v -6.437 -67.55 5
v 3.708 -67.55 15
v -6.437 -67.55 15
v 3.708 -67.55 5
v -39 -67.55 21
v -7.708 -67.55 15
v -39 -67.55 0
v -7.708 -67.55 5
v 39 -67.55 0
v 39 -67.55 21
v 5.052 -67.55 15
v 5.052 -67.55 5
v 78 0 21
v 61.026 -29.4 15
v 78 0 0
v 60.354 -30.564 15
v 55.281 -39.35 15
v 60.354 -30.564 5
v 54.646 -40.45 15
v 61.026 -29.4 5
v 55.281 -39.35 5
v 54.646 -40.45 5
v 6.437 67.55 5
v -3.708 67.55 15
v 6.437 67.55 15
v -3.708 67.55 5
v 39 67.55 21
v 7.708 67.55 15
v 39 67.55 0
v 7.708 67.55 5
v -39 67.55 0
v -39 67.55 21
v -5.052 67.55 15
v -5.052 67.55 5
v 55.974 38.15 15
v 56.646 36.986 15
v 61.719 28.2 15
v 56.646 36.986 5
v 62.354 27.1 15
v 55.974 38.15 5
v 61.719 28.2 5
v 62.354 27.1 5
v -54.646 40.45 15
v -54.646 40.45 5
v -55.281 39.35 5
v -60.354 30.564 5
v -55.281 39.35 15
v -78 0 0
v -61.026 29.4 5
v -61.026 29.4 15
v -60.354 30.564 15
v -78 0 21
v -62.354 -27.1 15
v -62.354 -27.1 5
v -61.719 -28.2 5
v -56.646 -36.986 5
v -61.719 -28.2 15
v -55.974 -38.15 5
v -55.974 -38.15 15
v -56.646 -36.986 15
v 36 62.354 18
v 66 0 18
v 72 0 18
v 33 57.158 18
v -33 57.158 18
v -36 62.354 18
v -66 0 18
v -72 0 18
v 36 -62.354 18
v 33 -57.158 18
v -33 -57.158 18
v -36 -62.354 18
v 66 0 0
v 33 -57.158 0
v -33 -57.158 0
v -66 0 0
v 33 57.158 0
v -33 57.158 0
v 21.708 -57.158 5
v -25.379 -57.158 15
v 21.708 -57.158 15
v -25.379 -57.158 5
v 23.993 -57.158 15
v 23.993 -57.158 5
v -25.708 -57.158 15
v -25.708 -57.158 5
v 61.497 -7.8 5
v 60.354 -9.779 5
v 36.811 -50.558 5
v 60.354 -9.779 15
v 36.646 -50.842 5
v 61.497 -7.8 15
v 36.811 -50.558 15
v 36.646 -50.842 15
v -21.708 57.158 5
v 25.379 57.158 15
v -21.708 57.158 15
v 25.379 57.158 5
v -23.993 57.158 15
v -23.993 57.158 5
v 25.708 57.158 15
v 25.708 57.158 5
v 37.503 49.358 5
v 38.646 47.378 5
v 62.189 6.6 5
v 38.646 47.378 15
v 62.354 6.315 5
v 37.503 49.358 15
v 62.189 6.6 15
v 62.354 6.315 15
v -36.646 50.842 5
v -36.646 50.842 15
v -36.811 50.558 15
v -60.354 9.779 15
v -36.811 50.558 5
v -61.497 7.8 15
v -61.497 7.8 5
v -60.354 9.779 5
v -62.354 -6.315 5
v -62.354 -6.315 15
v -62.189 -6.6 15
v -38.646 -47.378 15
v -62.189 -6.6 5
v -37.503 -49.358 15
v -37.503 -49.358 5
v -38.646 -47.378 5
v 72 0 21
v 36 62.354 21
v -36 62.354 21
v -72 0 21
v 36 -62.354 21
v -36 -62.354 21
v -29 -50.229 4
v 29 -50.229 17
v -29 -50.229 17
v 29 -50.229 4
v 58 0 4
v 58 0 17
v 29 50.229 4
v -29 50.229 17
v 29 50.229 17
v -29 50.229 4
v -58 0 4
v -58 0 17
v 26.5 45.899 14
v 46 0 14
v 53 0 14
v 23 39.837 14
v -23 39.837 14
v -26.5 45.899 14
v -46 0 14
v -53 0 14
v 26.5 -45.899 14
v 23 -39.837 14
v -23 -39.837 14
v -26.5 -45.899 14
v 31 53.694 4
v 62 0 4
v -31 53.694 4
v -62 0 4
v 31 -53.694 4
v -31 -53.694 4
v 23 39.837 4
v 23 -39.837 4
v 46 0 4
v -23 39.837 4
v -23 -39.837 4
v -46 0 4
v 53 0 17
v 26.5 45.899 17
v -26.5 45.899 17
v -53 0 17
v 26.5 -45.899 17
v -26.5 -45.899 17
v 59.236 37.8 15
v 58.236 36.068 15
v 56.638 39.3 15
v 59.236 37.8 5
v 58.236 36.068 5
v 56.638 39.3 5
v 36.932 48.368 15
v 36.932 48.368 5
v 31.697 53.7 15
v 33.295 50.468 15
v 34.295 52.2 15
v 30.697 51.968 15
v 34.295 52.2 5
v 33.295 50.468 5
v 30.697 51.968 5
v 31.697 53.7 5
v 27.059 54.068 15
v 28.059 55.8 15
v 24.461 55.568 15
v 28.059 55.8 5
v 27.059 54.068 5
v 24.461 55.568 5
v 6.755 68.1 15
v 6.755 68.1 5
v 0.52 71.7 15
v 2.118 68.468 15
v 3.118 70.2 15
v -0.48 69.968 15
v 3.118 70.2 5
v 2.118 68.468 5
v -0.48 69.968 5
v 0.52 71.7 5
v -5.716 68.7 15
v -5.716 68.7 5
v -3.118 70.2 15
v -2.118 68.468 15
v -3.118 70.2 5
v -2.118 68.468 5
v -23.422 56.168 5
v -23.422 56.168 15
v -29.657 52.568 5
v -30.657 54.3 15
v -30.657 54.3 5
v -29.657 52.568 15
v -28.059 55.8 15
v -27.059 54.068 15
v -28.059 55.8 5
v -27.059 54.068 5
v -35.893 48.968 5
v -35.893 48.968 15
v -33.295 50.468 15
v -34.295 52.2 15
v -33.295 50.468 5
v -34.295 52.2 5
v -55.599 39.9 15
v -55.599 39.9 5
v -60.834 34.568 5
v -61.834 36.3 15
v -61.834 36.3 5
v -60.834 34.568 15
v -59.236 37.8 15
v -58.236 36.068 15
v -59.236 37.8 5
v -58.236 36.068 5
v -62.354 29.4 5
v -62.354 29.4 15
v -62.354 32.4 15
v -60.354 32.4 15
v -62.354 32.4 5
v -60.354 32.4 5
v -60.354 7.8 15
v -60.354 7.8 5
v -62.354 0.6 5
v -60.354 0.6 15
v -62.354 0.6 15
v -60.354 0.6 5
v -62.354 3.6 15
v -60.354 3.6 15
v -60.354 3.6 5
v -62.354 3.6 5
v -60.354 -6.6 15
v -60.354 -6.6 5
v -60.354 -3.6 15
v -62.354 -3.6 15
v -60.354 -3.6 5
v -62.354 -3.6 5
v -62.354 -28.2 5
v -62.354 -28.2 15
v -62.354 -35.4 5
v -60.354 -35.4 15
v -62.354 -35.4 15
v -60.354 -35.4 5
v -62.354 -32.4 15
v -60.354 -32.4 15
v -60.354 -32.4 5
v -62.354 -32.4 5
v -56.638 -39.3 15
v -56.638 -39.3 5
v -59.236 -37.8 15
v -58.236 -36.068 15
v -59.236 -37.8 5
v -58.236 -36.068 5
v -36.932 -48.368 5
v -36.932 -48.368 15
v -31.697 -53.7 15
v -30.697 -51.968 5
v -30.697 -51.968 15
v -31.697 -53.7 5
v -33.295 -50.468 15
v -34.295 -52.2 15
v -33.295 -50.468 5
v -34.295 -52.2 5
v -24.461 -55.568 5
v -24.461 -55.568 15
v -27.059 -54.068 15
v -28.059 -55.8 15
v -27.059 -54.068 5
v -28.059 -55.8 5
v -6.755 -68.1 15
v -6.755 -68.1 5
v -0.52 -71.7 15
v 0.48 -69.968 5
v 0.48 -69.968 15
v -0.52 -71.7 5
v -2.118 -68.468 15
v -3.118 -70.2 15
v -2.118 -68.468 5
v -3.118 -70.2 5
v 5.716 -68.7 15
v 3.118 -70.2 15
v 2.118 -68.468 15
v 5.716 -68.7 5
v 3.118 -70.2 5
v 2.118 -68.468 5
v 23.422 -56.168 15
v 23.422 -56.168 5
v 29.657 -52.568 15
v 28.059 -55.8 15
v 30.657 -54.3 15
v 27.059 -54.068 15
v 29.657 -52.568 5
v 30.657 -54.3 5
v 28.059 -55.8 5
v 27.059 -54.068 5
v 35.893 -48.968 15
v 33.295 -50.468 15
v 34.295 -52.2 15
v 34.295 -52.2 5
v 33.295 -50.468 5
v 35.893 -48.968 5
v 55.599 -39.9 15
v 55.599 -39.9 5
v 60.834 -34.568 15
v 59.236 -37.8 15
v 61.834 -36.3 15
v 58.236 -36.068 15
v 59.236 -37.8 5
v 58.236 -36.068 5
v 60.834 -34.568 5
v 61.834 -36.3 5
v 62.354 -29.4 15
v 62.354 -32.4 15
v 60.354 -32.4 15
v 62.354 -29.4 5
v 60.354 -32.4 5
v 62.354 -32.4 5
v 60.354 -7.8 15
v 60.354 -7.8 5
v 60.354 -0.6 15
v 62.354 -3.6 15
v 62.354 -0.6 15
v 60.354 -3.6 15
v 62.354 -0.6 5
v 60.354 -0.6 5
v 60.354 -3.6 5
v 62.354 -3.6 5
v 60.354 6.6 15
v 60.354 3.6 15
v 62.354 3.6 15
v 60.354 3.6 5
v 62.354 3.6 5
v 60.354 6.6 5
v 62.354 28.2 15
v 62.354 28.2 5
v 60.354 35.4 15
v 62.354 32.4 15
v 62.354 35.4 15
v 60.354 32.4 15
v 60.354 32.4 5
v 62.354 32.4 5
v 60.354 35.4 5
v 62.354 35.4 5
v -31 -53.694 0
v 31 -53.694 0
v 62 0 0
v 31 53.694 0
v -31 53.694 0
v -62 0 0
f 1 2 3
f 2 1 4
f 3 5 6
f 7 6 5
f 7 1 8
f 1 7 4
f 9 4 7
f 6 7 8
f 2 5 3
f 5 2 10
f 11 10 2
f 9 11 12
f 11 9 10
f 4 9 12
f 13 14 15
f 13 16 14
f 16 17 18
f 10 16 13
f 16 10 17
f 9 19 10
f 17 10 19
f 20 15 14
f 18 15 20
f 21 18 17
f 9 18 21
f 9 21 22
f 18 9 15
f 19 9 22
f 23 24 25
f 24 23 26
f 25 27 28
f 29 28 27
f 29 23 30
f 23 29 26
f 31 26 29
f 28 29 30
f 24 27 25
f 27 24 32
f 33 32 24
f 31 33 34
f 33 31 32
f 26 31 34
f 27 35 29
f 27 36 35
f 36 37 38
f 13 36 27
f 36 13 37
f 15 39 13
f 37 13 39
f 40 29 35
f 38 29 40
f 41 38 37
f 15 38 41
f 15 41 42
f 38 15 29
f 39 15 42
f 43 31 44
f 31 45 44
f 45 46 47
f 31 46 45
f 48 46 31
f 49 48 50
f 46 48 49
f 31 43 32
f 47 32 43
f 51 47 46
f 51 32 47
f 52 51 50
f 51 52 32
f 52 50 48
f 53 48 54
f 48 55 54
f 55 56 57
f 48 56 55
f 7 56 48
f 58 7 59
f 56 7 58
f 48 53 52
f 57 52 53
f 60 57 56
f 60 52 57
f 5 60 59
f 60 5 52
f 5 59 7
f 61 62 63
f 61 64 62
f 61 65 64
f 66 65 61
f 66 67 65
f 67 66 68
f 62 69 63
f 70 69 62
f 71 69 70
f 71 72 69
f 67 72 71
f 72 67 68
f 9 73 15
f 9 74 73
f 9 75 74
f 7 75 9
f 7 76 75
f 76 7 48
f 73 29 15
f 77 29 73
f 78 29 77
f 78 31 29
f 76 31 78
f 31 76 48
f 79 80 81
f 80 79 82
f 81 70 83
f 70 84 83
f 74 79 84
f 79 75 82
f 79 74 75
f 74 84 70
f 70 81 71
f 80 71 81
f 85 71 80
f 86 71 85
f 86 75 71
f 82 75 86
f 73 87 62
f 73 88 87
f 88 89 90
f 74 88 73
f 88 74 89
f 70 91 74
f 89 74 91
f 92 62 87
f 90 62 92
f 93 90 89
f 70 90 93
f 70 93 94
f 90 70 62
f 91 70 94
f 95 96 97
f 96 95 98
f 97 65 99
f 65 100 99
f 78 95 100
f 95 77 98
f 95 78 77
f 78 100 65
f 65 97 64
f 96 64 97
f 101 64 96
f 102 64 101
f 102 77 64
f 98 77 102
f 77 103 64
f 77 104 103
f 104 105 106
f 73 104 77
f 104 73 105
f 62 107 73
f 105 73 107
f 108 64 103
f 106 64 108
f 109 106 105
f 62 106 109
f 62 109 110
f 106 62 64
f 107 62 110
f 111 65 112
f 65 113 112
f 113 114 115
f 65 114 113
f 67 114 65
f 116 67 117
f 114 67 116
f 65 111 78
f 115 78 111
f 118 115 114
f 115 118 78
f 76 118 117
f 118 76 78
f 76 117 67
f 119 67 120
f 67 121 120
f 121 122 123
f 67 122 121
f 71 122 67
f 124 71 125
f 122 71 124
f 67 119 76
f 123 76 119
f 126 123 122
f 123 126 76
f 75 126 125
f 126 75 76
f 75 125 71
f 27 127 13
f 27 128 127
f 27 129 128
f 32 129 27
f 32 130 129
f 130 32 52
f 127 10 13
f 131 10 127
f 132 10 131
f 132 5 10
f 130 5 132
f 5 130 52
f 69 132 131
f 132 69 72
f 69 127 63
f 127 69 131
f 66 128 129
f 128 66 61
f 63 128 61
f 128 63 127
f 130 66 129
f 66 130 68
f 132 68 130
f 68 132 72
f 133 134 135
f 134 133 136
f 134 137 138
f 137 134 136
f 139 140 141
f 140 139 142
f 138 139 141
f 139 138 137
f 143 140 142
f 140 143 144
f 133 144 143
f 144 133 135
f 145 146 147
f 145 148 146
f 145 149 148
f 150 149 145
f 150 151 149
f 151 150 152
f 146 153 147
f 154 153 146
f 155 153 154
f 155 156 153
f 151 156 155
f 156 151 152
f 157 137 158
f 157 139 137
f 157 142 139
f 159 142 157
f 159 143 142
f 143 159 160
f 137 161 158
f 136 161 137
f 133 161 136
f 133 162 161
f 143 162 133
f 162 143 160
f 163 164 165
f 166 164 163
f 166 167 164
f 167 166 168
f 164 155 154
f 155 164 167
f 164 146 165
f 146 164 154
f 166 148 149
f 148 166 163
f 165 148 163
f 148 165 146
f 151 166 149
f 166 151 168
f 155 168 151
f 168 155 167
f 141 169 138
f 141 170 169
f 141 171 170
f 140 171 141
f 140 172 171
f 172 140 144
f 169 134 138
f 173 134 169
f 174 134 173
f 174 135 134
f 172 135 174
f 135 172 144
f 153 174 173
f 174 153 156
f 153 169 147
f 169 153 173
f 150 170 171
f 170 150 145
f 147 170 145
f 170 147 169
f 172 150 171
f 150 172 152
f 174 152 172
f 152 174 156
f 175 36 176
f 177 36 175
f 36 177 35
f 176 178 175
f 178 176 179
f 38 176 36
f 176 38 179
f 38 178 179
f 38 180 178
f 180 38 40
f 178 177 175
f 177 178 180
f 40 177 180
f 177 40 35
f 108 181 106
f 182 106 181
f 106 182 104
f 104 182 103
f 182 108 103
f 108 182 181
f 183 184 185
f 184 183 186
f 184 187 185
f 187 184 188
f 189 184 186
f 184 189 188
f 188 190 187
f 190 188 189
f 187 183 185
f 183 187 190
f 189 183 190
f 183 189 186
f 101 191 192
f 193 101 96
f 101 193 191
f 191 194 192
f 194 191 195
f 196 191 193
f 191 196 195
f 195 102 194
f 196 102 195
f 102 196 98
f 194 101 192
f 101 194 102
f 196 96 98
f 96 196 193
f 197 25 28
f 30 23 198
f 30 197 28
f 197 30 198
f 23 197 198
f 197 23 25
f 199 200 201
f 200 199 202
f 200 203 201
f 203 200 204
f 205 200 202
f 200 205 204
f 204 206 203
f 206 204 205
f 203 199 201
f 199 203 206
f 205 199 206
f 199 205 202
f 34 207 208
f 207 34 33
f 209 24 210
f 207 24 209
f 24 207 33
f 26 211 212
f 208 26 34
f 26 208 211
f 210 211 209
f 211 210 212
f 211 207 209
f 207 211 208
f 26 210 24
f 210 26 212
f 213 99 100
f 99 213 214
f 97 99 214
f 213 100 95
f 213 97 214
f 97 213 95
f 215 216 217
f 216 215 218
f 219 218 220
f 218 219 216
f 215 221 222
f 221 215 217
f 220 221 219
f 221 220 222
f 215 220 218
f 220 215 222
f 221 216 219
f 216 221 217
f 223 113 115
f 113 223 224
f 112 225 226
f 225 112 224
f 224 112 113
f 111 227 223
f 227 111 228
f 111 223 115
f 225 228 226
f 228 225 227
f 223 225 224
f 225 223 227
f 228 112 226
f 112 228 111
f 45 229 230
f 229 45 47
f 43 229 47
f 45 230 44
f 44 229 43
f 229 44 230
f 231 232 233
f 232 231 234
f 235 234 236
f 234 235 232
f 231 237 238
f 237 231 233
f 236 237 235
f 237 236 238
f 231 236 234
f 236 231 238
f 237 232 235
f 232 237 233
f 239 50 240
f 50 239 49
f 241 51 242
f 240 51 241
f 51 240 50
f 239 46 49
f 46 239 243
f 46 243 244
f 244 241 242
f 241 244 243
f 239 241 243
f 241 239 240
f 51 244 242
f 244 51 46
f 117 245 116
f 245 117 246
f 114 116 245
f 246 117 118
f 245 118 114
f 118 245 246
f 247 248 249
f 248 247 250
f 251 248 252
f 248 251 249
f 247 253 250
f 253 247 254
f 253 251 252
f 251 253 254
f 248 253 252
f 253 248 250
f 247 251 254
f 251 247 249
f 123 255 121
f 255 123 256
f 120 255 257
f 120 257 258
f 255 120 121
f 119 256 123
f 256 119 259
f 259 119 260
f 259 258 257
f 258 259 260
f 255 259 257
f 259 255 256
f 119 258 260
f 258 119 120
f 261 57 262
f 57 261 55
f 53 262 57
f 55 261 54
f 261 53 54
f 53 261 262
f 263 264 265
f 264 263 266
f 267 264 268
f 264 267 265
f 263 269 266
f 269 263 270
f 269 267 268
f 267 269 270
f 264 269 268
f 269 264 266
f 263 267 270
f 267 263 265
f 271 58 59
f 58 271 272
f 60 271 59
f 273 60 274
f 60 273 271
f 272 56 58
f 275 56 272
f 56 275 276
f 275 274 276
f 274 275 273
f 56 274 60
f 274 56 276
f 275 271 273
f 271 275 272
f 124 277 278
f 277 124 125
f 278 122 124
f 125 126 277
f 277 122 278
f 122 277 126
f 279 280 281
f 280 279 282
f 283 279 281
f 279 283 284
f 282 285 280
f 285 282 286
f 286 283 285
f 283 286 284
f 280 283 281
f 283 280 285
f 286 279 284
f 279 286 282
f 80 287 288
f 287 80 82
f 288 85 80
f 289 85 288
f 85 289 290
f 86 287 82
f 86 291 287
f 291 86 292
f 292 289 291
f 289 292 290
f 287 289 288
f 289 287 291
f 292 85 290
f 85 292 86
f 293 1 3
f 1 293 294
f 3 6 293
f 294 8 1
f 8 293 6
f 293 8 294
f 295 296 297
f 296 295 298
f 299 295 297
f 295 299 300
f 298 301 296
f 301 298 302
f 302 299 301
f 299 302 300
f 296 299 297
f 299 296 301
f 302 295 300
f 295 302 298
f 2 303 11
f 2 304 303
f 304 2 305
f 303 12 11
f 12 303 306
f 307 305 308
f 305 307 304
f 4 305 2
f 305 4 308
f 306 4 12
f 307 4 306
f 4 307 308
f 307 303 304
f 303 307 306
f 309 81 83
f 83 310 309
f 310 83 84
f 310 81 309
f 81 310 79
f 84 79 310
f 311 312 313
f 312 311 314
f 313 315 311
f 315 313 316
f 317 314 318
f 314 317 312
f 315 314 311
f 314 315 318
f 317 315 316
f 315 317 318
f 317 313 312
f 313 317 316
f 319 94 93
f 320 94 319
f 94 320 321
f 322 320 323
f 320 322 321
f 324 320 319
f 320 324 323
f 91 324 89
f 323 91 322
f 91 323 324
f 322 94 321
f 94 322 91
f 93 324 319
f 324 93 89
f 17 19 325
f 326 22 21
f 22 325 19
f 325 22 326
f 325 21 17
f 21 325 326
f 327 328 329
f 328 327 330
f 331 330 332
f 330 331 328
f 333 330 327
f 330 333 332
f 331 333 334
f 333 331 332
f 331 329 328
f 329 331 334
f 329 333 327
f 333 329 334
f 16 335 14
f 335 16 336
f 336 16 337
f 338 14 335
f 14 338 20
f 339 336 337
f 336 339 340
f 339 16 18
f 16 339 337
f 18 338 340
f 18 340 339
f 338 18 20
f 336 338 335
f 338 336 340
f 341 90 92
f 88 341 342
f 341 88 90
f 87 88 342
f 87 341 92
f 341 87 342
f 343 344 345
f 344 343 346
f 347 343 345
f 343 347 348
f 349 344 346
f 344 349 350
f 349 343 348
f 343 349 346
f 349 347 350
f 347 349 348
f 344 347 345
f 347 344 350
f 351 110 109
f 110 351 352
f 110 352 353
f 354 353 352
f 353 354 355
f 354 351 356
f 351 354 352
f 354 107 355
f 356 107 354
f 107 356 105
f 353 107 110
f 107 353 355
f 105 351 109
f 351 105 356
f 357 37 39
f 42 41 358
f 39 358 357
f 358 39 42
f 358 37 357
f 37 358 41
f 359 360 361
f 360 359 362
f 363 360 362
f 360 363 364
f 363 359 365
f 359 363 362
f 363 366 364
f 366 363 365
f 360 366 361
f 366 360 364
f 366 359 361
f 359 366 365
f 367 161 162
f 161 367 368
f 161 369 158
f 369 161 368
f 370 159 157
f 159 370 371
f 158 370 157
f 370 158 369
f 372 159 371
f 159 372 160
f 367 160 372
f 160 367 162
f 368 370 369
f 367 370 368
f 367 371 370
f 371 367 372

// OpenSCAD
/*
  REAKT - Modulo hexagonal estilo referencia Tinkercad.
  Conceptual / no validado fisicamente.
*/

$fn = 96;

view = "assembly"; // assembly, blue, red

outer_radius = 78;
outer_inner_radius = 66;
floor_radius = 62;
red_outer = 58;
red_inner = 46;

module hex_prism(r, h) {
  cylinder(r = r, h = h, $fn = 6);
}

module hex_ring(outer_r, inner_r, h) {
  difference() {
    hex_prism(outer_r, h);
    translate([0, 0, -0.1]) hex_prism(inner_r, h + 0.2);
  }
}

module floor_blue() {
  color([0.08, 0.20, 0.55])
    hex_prism(floor_radius, 4);
}

module outer_blue() {
  color([0.04, 0.12, 0.34])
    hex_ring(outer_radius, outer_inner_radius, 18);

  color([0.04, 0.12, 0.34])
    translate([0, 0, 17])
      hex_ring(outer_radius, outer_radius - 6, 4);
}

module red_inner_ring() {
  color([0.86, 0.02, 0.06])
    translate([0, 0, 4])
      hex_ring(red_outer, red_inner, 10);

  color([0.74, 0.01, 0.05])
    translate([0, 0, 14])
      hex_ring(red_outer, red_outer - 5, 3);
}

module slot_markers() {
  color([0.92, 0.95, 0.93])
    for (side = [0:5]) {
      p1 = [cos(30 + side * 60) * (outer_radius - 6), sin(30 + side * 60) * (outer_radius - 6)];
      p2 = [cos(30 + ((side + 1) % 6) * 60) * (outer_radius - 6), sin(30 + ((side + 1) % 6) * 60) * (outer_radius - 6)];
      angle = atan2(p2[1] - p1[1], p2[0] - p1[0]);
      for (i = [0:9]) {
        t = (i + 0.5) / 10;
        x = p1[0] + (p2[0] - p1[0]) * t;
        y = p1[1] + (p2[1] - p1[1]) * t;
        translate([x, y, 5])
          rotate([0, 0, angle])
            cube([3, 2, 10], center = false);
      }
    }
}

module assembly() {
  floor_blue();
  outer_blue();
  red_inner_ring();
  slot_markers();
}

if (view == "assembly") assembly();
if (view == "blue") { floor_blue(); outer_blue(); slot_markers(); }
if (view == "red") red_inner_ring();
